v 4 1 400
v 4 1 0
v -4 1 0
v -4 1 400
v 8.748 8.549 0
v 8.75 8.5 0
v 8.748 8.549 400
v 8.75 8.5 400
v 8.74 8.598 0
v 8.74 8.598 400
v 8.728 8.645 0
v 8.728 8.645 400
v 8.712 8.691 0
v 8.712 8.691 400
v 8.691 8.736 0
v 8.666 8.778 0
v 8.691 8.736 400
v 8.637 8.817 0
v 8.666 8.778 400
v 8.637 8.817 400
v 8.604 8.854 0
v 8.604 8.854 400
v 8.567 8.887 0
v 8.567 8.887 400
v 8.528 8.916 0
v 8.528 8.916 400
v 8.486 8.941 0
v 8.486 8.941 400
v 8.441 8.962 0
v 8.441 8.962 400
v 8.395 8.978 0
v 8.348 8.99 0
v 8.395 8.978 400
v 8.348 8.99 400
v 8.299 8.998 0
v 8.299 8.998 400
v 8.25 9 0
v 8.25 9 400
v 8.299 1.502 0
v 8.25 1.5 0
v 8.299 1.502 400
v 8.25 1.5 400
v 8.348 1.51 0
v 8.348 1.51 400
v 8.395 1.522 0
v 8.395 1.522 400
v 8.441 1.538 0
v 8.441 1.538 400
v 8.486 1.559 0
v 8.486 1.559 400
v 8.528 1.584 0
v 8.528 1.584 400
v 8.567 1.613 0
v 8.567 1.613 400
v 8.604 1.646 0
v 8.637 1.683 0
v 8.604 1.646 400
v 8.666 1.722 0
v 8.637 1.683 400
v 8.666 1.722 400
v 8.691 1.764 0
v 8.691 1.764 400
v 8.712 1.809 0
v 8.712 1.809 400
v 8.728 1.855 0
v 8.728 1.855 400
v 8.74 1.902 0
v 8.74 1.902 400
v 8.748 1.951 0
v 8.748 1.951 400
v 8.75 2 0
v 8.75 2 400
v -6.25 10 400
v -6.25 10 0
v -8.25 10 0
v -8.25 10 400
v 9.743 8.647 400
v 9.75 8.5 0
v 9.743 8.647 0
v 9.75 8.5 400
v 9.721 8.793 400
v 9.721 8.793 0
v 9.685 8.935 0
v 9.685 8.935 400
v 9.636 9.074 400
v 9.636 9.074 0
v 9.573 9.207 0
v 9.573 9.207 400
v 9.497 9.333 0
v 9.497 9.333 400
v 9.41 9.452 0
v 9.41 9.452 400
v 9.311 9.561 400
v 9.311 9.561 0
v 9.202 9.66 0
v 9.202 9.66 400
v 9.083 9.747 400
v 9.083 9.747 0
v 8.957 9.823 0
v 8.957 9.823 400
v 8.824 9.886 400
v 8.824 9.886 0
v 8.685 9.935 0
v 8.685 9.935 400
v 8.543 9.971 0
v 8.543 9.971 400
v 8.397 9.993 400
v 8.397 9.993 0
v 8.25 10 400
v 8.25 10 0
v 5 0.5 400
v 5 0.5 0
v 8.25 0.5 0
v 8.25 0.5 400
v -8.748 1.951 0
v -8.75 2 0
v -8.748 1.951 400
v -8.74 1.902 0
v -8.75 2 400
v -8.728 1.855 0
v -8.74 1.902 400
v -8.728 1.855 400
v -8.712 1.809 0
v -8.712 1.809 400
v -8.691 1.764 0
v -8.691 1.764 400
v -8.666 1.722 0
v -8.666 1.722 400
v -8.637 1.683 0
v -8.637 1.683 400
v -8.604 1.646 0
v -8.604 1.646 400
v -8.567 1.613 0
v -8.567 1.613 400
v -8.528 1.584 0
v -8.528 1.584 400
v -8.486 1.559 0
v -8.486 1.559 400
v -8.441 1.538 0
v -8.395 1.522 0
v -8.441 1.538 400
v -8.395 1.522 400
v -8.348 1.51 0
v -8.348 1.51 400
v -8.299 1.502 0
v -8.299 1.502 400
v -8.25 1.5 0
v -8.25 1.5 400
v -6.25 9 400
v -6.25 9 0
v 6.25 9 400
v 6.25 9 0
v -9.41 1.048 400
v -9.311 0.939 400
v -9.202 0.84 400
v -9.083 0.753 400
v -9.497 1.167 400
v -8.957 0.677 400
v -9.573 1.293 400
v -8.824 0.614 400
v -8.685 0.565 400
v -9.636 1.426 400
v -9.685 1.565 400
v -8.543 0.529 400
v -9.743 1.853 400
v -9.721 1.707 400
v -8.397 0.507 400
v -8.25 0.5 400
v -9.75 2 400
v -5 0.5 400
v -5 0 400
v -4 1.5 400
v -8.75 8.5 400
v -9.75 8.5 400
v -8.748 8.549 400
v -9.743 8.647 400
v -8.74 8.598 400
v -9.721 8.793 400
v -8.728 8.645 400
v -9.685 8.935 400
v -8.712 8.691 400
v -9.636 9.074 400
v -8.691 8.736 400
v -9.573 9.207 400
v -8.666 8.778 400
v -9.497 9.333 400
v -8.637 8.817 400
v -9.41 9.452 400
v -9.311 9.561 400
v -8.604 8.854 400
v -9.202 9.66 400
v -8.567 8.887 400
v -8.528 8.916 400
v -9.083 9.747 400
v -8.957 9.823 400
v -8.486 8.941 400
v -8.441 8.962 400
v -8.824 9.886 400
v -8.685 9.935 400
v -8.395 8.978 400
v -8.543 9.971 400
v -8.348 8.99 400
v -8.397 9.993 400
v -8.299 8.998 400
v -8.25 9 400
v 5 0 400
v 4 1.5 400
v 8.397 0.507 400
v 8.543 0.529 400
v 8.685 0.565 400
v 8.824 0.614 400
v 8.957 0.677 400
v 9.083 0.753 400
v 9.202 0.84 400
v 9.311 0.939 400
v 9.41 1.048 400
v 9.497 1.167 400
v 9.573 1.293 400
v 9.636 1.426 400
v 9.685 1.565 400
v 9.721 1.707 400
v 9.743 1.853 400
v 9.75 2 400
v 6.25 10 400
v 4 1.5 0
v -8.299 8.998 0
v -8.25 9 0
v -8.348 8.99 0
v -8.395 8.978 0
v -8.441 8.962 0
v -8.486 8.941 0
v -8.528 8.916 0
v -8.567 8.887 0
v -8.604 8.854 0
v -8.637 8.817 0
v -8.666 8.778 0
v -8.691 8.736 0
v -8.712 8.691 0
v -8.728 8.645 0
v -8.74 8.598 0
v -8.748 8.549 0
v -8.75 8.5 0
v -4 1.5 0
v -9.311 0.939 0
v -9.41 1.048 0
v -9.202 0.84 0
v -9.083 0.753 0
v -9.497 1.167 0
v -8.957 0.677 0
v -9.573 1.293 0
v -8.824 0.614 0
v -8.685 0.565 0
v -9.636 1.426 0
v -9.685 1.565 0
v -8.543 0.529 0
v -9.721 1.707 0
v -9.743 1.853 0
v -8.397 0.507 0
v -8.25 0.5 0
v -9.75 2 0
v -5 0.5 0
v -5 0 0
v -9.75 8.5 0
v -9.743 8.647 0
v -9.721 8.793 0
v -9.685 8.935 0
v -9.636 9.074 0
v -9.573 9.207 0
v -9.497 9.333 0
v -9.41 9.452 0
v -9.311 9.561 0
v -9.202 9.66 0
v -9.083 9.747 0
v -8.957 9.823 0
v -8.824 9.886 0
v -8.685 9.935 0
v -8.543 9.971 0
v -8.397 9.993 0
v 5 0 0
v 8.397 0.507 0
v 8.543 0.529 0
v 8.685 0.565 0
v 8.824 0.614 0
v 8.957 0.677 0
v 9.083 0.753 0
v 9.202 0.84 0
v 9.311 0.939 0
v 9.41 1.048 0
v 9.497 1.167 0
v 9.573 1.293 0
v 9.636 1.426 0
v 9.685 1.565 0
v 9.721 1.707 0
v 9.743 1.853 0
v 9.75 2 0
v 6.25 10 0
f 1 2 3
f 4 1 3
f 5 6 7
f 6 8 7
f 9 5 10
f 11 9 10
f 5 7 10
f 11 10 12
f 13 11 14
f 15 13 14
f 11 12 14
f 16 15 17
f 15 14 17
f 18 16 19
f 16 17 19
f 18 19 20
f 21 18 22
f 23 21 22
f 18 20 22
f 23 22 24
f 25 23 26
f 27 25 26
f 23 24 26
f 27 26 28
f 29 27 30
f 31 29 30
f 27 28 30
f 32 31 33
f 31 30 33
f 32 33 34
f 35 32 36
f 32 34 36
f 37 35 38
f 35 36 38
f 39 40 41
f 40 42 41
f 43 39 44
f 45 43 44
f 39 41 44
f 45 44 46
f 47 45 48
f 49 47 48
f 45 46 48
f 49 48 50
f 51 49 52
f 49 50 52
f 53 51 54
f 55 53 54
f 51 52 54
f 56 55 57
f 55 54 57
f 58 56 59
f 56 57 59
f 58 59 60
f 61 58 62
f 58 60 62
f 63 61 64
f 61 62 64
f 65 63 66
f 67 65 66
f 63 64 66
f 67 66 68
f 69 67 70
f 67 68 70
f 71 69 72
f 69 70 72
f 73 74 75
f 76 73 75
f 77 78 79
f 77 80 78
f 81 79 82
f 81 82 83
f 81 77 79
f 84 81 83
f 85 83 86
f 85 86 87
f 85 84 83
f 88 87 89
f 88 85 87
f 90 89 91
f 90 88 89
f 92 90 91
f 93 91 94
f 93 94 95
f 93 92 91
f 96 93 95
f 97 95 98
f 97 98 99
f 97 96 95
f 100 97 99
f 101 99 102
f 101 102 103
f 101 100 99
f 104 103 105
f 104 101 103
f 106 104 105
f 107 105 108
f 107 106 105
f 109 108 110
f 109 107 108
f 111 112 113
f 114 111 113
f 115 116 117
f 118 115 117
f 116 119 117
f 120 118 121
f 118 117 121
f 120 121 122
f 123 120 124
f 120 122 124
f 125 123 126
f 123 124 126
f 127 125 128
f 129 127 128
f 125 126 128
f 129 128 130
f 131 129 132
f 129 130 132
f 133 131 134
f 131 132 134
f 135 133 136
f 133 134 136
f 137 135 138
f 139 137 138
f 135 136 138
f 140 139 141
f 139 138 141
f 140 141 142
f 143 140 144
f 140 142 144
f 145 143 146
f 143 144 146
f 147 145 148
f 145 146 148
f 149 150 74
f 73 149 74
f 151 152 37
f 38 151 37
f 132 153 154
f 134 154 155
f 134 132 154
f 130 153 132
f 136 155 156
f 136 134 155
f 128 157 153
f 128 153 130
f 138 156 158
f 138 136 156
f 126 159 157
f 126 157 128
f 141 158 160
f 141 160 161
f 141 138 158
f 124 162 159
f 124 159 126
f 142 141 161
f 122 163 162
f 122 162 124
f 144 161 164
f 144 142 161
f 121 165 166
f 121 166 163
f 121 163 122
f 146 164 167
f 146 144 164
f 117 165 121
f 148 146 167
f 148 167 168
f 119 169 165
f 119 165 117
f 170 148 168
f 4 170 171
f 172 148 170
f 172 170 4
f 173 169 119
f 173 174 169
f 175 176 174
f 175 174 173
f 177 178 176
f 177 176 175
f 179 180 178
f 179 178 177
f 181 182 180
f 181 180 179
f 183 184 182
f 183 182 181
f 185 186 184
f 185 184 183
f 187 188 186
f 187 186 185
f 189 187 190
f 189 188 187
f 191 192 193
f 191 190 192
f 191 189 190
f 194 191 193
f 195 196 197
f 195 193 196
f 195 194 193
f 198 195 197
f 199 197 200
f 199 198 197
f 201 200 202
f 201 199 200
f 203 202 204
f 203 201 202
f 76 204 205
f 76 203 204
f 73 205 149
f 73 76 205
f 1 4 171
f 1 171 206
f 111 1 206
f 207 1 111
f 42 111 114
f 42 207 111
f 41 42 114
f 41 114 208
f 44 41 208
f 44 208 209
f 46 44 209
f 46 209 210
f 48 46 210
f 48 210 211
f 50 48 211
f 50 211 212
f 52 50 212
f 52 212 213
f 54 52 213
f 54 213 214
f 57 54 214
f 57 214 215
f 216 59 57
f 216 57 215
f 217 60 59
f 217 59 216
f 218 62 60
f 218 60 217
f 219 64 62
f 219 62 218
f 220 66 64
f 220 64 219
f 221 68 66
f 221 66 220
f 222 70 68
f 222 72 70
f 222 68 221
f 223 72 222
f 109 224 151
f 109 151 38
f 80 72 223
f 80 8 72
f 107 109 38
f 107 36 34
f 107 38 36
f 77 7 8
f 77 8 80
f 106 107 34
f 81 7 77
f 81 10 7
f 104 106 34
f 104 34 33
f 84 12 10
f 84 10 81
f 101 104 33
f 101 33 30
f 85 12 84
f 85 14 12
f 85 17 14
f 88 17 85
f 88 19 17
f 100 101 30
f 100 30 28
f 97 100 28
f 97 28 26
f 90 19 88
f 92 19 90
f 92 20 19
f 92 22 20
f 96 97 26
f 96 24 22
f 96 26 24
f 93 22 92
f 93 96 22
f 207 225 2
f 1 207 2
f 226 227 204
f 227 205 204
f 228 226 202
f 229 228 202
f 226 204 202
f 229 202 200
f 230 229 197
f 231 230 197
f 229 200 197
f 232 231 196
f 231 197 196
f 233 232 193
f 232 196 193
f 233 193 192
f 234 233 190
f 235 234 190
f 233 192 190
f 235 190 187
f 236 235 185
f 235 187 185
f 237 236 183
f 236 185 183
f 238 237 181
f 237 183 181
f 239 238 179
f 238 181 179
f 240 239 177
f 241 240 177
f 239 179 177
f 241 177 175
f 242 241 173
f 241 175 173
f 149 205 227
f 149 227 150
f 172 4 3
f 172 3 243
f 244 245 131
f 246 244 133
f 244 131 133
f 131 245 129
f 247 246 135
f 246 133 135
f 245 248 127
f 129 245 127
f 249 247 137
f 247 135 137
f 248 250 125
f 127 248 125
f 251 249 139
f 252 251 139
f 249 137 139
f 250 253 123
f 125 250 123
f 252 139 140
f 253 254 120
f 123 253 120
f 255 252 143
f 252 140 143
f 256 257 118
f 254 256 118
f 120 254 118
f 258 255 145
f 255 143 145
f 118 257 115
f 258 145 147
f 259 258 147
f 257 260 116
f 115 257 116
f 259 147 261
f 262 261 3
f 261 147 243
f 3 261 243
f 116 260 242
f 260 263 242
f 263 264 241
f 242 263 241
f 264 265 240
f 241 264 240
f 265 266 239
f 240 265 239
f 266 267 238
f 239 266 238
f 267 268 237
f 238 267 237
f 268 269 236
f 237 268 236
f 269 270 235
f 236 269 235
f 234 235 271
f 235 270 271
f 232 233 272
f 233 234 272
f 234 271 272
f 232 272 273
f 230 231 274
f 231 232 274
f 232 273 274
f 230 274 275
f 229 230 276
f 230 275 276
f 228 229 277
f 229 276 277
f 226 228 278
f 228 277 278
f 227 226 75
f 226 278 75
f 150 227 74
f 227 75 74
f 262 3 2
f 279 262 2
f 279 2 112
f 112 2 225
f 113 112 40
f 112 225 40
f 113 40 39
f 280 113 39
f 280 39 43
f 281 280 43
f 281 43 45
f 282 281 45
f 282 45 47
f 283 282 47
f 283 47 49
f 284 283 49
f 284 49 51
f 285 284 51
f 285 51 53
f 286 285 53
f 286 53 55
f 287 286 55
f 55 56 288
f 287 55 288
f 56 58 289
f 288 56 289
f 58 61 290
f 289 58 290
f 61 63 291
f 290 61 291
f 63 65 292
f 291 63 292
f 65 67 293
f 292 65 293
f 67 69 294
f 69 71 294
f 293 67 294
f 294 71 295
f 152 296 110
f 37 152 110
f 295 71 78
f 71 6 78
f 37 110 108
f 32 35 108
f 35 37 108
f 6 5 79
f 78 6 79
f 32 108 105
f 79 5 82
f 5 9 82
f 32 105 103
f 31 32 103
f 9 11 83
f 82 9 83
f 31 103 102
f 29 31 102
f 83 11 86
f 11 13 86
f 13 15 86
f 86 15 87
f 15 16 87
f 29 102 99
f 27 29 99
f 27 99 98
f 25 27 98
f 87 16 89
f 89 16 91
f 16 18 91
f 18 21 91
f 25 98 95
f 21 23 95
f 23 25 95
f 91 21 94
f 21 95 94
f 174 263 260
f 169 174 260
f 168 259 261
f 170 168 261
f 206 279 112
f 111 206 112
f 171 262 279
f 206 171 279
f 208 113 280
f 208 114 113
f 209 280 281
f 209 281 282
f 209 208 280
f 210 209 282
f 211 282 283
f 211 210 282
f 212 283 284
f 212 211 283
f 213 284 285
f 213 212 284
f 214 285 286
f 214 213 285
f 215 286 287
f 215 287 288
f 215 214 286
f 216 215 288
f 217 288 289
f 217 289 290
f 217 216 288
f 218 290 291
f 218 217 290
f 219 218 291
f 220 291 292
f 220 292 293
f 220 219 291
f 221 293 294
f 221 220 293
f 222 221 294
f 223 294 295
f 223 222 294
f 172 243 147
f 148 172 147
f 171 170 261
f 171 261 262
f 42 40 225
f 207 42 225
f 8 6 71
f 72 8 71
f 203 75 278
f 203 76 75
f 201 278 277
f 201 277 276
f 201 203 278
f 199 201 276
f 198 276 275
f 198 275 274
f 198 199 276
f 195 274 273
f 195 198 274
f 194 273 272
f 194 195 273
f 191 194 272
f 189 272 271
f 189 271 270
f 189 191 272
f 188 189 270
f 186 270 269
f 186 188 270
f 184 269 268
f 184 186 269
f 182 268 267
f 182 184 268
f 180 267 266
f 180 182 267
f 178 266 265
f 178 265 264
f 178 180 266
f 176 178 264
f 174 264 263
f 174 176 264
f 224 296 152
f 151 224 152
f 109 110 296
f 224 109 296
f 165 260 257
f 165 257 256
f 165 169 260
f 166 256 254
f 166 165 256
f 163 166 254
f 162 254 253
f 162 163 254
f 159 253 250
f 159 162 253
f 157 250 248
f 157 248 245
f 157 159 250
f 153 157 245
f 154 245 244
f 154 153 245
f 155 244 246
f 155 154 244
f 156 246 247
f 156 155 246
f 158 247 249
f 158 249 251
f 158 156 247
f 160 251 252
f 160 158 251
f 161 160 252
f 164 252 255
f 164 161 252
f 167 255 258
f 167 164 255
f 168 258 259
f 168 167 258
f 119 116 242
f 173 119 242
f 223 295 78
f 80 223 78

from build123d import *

# Parameters (mm, degrees)
BASE_EXTRU_MINCE_DEPTH = 400
CONG_1_R               = 1.5
CONG_2_R               = 0.5


with BuildPart() as part:
    # Esquisse1 → Base-Extru.-Mince (new body)
    with BuildSketch(Plane.XY):
        Polygon((-6.25, 10), (-9.75, 10), (-9.75, 0.5), (-5, 0.5), (-5, 0), (5, 0), (5, 0.5), (9.75, 0.5), (9.75, 10), (6.25, 10), (6.25, 9), (8.75, 9), (8.75, 1.5), (4, 1.5), (4, 1), (-4, 1), (-4, 1.5), (-8.75, 1.5), (-8.75, 9), (-6.25, 9), align=None)
    extrude(amount=BASE_EXTRU_MINCE_DEPTH)

    # Congé1
    cong_1_edges = [part.edges().sort_by_distance(p)[0] for p in [
        (-9.75, 10, 200),
        (-9.75, 0.5, 200),
        (9.75, 0.5, 200),
        (9.75, 10, 200),
    ]]
    fillet(cong_1_edges, radius=CONG_1_R)

    # Congé2
    cong_2_edges = [part.edges().sort_by_distance(p)[0] for p in [
        (-8.75, 9, 200),
        (-8.75, 1.5, 200),
        (8.75, 1.5, 200),
        (8.75, 9, 200),
    ]]
    fillet(cong_2_edges, radius=CONG_2_R)


solid = part.part
